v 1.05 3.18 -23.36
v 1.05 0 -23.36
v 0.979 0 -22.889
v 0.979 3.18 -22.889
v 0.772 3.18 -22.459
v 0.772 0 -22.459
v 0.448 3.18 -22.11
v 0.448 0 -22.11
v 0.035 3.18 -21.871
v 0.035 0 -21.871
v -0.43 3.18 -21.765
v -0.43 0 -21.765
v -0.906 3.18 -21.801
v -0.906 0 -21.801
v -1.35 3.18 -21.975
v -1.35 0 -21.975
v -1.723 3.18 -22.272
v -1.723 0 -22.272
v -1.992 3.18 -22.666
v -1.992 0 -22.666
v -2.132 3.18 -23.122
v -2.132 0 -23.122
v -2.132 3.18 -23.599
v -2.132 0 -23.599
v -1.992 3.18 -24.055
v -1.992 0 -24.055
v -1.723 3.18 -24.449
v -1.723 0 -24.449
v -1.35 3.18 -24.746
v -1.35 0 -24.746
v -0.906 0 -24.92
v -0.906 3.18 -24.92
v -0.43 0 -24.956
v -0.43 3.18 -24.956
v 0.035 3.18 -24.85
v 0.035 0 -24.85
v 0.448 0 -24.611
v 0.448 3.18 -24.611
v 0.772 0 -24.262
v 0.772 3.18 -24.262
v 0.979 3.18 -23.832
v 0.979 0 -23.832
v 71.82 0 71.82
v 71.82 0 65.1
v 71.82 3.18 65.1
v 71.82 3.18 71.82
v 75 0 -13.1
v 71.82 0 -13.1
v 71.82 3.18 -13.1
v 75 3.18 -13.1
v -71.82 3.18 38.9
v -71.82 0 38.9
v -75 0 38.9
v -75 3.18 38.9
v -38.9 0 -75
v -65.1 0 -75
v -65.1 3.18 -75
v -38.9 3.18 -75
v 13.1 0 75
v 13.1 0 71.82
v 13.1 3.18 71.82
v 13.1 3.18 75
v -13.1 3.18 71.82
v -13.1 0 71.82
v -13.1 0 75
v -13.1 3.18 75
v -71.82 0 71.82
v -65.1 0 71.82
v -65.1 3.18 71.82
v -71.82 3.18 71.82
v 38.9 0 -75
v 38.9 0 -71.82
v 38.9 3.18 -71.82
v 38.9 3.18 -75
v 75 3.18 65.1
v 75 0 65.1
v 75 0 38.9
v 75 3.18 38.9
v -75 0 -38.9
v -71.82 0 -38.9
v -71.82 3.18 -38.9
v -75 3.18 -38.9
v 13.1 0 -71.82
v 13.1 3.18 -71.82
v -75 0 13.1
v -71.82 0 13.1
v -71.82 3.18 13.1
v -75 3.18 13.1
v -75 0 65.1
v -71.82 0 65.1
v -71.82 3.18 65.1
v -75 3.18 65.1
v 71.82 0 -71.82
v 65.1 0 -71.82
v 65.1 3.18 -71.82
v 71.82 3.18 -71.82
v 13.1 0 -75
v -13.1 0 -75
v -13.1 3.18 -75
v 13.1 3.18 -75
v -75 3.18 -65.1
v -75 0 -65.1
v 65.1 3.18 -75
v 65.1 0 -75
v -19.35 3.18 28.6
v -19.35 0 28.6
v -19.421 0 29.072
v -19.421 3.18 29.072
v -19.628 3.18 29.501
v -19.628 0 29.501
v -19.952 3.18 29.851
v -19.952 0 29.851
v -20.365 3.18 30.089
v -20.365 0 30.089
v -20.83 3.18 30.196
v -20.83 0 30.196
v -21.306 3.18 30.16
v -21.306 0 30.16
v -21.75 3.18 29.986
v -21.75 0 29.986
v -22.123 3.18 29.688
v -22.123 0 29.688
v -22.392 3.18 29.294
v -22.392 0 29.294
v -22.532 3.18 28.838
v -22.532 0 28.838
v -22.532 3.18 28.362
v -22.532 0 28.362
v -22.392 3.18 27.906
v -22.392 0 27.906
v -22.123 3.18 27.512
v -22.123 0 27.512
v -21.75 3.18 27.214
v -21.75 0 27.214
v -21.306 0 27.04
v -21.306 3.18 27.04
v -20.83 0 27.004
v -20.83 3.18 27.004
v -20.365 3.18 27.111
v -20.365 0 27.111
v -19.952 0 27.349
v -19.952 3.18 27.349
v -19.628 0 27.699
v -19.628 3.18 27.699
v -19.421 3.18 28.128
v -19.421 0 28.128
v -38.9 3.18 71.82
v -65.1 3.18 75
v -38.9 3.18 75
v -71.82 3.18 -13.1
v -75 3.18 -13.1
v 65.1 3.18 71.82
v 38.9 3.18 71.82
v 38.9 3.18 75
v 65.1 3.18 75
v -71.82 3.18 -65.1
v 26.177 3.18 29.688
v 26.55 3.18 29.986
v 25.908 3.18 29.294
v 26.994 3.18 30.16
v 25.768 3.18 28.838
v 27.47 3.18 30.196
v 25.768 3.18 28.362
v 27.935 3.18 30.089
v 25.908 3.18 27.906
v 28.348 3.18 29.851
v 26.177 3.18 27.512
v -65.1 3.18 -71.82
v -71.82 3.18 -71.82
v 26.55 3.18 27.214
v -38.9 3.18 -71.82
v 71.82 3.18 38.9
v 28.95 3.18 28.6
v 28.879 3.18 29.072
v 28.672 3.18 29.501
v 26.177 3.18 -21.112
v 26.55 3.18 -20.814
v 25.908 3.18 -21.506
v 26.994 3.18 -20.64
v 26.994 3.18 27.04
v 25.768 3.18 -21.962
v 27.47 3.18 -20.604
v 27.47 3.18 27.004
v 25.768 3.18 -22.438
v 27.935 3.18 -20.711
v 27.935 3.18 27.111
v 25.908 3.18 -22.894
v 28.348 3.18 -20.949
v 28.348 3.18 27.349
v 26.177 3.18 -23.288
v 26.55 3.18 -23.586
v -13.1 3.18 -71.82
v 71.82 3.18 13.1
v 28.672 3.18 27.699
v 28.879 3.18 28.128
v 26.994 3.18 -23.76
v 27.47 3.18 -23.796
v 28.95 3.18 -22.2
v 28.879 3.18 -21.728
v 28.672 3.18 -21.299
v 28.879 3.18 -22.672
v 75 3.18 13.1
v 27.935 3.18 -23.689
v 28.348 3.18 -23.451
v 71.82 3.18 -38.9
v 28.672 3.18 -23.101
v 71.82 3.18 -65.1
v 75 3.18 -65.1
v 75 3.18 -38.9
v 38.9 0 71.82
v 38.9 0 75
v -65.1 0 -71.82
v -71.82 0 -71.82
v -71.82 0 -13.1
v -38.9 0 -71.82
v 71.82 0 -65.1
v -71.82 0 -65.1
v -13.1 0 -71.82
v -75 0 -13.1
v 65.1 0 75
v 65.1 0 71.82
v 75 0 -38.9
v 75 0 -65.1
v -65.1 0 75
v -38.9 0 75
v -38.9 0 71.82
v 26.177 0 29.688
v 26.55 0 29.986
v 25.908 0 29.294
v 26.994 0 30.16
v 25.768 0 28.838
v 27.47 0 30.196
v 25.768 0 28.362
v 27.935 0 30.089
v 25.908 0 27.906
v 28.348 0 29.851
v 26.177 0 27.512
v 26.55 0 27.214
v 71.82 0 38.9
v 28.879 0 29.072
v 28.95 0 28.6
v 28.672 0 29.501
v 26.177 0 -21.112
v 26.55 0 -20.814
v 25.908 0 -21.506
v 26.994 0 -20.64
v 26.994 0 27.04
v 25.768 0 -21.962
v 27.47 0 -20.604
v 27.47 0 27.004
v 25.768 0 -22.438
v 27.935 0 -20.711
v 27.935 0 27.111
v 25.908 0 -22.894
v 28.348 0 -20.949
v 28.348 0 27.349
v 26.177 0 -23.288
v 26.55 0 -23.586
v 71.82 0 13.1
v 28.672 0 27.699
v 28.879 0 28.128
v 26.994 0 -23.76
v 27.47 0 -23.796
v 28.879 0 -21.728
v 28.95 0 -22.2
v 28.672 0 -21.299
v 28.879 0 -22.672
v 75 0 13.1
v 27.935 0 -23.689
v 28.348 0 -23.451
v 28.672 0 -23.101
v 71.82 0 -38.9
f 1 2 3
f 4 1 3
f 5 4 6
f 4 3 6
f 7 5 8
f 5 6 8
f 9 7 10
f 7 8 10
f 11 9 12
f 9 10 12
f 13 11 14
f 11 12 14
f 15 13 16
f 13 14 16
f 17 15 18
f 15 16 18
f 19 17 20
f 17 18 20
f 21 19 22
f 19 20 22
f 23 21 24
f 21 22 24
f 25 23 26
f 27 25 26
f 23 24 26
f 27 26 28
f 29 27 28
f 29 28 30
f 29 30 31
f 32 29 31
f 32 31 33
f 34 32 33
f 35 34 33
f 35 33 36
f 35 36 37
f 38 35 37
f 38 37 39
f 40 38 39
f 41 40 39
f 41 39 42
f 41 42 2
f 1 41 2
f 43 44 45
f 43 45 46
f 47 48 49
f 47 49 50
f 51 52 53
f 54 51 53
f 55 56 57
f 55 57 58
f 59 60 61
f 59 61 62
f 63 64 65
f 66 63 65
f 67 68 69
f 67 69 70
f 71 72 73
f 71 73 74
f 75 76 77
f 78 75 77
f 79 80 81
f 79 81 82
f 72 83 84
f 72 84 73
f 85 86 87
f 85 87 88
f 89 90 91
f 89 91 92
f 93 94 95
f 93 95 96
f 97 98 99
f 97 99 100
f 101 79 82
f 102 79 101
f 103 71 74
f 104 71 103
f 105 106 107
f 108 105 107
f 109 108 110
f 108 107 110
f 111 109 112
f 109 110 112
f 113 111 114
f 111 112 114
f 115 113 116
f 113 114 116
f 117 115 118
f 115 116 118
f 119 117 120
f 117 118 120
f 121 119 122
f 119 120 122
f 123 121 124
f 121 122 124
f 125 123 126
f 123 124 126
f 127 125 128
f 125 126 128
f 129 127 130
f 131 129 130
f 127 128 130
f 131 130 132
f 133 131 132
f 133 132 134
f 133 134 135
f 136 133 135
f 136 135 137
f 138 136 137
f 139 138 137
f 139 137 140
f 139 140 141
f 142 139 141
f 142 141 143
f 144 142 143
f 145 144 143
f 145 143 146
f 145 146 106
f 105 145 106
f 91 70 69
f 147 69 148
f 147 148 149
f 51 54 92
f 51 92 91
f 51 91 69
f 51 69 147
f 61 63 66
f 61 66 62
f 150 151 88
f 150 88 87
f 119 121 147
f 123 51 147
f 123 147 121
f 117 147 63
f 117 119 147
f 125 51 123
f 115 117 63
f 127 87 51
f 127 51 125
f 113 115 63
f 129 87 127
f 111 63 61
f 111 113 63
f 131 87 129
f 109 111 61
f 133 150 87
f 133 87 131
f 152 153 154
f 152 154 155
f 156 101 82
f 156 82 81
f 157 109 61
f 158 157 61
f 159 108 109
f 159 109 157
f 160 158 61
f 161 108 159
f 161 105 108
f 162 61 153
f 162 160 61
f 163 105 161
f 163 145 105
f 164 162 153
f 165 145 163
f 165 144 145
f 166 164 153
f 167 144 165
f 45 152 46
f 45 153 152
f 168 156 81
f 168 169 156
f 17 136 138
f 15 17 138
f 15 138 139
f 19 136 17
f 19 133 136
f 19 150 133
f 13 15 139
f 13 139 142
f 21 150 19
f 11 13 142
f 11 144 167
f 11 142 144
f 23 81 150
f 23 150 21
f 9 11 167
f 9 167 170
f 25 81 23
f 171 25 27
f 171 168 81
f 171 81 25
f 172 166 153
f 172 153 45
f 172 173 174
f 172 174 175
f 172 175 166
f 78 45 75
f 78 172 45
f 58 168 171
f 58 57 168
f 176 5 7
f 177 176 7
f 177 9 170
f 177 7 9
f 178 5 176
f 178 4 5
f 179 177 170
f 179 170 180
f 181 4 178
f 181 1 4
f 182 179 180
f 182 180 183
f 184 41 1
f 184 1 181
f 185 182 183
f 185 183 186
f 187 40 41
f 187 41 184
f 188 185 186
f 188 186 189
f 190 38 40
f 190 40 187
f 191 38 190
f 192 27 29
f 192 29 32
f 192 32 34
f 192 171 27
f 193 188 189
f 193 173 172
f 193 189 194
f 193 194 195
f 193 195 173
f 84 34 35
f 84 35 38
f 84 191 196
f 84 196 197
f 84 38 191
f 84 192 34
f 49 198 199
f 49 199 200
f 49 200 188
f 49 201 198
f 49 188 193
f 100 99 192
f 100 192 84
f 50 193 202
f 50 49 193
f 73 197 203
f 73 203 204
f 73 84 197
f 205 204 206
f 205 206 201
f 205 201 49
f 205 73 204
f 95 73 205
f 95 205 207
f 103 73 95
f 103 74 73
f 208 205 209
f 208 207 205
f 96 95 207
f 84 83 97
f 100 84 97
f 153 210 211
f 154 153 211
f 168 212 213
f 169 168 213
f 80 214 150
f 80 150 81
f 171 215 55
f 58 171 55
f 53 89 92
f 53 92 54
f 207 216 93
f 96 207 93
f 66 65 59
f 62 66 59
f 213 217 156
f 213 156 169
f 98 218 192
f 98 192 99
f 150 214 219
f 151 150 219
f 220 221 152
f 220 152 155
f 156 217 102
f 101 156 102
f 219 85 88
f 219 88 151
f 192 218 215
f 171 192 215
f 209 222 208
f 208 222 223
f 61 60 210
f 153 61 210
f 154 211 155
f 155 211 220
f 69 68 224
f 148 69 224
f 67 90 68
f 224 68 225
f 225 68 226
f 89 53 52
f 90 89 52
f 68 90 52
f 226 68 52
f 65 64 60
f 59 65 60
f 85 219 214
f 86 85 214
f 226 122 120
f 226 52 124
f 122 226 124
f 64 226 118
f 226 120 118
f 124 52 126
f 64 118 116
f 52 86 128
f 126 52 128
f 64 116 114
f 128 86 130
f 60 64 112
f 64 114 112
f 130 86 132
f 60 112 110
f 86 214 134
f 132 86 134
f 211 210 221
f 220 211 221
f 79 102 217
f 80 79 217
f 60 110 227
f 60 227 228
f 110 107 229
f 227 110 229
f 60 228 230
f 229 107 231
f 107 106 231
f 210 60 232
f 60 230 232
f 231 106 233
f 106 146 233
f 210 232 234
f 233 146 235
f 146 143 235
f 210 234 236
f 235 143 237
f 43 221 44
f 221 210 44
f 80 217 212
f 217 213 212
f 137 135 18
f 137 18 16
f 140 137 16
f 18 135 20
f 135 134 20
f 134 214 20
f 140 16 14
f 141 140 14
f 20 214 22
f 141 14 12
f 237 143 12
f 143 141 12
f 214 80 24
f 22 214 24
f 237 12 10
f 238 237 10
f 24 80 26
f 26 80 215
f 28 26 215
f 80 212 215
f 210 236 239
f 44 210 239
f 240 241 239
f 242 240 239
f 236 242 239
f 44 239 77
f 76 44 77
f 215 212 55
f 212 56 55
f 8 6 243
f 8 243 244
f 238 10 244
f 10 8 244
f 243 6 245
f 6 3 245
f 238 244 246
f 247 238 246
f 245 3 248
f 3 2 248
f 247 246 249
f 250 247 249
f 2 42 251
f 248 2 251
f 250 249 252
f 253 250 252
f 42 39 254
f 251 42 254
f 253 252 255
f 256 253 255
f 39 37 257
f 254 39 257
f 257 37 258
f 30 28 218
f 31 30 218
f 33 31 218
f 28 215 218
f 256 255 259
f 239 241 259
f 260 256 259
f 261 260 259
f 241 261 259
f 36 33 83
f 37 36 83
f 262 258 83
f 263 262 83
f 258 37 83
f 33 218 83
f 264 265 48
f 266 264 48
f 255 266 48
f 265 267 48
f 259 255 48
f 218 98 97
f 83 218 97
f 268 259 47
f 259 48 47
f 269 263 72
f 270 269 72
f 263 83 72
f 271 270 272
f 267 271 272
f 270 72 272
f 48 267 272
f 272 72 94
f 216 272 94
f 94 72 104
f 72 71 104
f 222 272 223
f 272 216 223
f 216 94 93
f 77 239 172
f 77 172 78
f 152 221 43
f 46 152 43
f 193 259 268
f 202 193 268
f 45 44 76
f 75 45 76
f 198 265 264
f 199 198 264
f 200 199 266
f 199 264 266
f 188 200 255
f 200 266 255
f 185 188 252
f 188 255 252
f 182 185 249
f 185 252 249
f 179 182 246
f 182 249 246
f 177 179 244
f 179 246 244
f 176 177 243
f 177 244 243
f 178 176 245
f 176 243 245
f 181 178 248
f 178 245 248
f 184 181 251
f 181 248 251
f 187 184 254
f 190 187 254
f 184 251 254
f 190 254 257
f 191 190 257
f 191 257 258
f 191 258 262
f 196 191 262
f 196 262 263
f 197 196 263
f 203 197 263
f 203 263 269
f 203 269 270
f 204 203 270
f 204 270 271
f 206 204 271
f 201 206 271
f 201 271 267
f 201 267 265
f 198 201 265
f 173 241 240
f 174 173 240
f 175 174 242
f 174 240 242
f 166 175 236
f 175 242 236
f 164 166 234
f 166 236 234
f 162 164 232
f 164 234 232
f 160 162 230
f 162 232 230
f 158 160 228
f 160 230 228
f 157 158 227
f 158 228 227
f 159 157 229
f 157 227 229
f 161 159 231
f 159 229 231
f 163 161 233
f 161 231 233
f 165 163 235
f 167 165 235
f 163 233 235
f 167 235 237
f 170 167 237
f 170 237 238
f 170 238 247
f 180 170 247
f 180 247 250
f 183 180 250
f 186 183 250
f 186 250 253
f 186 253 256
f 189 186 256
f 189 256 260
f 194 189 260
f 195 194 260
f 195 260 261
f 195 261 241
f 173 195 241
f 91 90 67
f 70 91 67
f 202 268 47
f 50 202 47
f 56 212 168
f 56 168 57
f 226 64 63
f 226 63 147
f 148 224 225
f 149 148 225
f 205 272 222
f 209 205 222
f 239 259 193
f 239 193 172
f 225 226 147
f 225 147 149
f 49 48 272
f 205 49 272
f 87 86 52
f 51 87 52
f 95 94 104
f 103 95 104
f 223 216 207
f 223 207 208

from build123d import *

# Parameters (mm, degrees)
SKETCH1_W                 = 150
SKETCH1_H                 = 150
BOSS_EXTRUDE1_DEPTH       = 3.18
SKETCH9_W                 = 3.18
SKETCH9_H                 = 9.9
SKETCH9_H_2               = 25.8
CUT_EXTRUDE7_DEPTH        = 10
MIRROR2_COPY_1_SKETCH_W   = 3.18
MIRROR2_COPY_1_SKETCH_H   = 9.9
MIRROR2_COPY_1_SKETCH_H_2 = 25.8
MIRROR2_COPY_1_DEPTH      = 10
SKETCH10_W                = 6.72
SKETCH10_H                = 3.18
SKETCH10_W_2              = 25.8
CUT_EXTRUDE8_DEPTH        = 10
MIRROR5_COPY_1_SKETCH_W   = 6.72
MIRROR5_COPY_1_SKETCH_H   = 3.18
MIRROR5_COPY_1_SKETCH_W_2 = 25.8
MIRROR5_COPY_1_DEPTH      = 10
SKETCH11_R                = 1.6
CUT_EXTRUDE9_DEPTH        = 10
SKETCH12_R                = 1.6
CUT_EXTRUDE10_DEPTH       = 10
SKETCH13_R                = 1.6
CUT_EXTRUDE11_DEPTH       = 10
SKETCH14_R                = 1.6
CUT_EXTRUDE12_DEPTH       = 10


with BuildPart() as part:
    # Sketch1 → Boss-Extrude1 (new body)
    with BuildSketch(Plane(origin=(0, 0, 0), x_dir=(1, 0, 0), z_dir=(0, 1, 0))):
        Rectangle(SKETCH1_W, SKETCH1_H)
    extrude(amount=BOSS_EXTRUDE1_DEPTH)

    # Sketch9 → Cut-Extrude7 (cut)
    with BuildSketch(Plane.XZ):
        with Locations((73.41, 70.05)):
            Rectangle(SKETCH9_W, SKETCH9_H)
        with Locations((73.41, 26)):
            Rectangle(SKETCH9_W, SKETCH9_H_2)
    cut_extrude7 = extrude(amount=-CUT_EXTRUDE7_DEPTH, mode=Mode.SUBTRACT)

    # Mirror1: Cut-Extrude7 across plane
    add(cut_extrude7.mirror(Plane.XY), mode=Mode.SUBTRACT)

    # Mirror2: Cut-Extrude7 across plane
    add(cut_extrude7.mirror(Plane(origin=(0, 0, 0), x_dir=(0, 0, 1), z_dir=(1, 0, 0))), mode=Mode.SUBTRACT)

    # Mirror2 copy 1 sketch → Mirror2 copy 1 (cut)
    with BuildSketch(Plane(origin=(0, 0, 0), x_dir=(-1, 0, 0), z_dir=(0, -1, 0))):
        with Locations((73.41, 70.05)):
            Rectangle(MIRROR2_COPY_1_SKETCH_W, MIRROR2_COPY_1_SKETCH_H)
        with Locations((73.41, 26)):
            Rectangle(MIRROR2_COPY_1_SKETCH_W, MIRROR2_COPY_1_SKETCH_H_2)
    extrude(amount=-MIRROR2_COPY_1_DEPTH, mode=Mode.SUBTRACT)

    # Sketch10 → Cut-Extrude8 (cut)
    with BuildSketch(Plane.XZ):
        with Locations((68.46, 73.41)):
            Rectangle(SKETCH10_W, SKETCH10_H)
        with Locations((26, 73.41)):
            Rectangle(SKETCH10_W_2, SKETCH10_H)
    cut_extrude8 = extrude(amount=-CUT_EXTRUDE8_DEPTH, mode=Mode.SUBTRACT)

    # Mirror4: Cut-Extrude8 across plane
    add(cut_extrude8.mirror(Plane(origin=(0, 0, 0), x_dir=(0, 0, 1), z_dir=(1, 0, 0))), mode=Mode.SUBTRACT)

    # Mirror5: Cut-Extrude8 across plane
    add(cut_extrude8.mirror(Plane.XY), mode=Mode.SUBTRACT)

    # Mirror5 copy 1 sketch → Mirror5 copy 1 (cut)
    with BuildSketch(Plane(origin=(0, 0, 0), x_dir=(-1, 0, 0), z_dir=(0, -1, 0))):
        with Locations((68.46, 73.41)):
            Rectangle(MIRROR5_COPY_1_SKETCH_W, MIRROR5_COPY_1_SKETCH_H)
        with Locations((26, 73.41)):
            Rectangle(MIRROR5_COPY_1_SKETCH_W_2, MIRROR5_COPY_1_SKETCH_H)
    extrude(amount=-MIRROR5_COPY_1_DEPTH, mode=Mode.SUBTRACT)

    # Sketch11 → Cut-Extrude9 (cut)
    with BuildSketch(Plane.XZ):
        with Locations((27.35, 28.6)):
            Circle(SKETCH11_R)
    extrude(amount=-CUT_EXTRUDE9_DEPTH, mode=Mode.SUBTRACT)

    # Sketch12 → Cut-Extrude10 (cut)
    with BuildSketch(Plane.XZ):
        with Locations((-20.95, 28.6)):
            Circle(SKETCH12_R)
    extrude(amount=-CUT_EXTRUDE10_DEPTH, mode=Mode.SUBTRACT)

    # Sketch13 → Cut-Extrude11 (cut)
    with BuildSketch(Plane.XZ):
        with Locations((27.35, -22.2)):
            Circle(SKETCH13_R)
    extrude(amount=-CUT_EXTRUDE11_DEPTH, mode=Mode.SUBTRACT)

    # Sketch14 → Cut-Extrude12 (cut)
    with BuildSketch(Plane.XZ):
        with Locations((-0.55, -23.360495604)):
            Circle(SKETCH14_R)
    extrude(amount=-CUT_EXTRUDE12_DEPTH, mode=Mode.SUBTRACT)


solid = part.part
